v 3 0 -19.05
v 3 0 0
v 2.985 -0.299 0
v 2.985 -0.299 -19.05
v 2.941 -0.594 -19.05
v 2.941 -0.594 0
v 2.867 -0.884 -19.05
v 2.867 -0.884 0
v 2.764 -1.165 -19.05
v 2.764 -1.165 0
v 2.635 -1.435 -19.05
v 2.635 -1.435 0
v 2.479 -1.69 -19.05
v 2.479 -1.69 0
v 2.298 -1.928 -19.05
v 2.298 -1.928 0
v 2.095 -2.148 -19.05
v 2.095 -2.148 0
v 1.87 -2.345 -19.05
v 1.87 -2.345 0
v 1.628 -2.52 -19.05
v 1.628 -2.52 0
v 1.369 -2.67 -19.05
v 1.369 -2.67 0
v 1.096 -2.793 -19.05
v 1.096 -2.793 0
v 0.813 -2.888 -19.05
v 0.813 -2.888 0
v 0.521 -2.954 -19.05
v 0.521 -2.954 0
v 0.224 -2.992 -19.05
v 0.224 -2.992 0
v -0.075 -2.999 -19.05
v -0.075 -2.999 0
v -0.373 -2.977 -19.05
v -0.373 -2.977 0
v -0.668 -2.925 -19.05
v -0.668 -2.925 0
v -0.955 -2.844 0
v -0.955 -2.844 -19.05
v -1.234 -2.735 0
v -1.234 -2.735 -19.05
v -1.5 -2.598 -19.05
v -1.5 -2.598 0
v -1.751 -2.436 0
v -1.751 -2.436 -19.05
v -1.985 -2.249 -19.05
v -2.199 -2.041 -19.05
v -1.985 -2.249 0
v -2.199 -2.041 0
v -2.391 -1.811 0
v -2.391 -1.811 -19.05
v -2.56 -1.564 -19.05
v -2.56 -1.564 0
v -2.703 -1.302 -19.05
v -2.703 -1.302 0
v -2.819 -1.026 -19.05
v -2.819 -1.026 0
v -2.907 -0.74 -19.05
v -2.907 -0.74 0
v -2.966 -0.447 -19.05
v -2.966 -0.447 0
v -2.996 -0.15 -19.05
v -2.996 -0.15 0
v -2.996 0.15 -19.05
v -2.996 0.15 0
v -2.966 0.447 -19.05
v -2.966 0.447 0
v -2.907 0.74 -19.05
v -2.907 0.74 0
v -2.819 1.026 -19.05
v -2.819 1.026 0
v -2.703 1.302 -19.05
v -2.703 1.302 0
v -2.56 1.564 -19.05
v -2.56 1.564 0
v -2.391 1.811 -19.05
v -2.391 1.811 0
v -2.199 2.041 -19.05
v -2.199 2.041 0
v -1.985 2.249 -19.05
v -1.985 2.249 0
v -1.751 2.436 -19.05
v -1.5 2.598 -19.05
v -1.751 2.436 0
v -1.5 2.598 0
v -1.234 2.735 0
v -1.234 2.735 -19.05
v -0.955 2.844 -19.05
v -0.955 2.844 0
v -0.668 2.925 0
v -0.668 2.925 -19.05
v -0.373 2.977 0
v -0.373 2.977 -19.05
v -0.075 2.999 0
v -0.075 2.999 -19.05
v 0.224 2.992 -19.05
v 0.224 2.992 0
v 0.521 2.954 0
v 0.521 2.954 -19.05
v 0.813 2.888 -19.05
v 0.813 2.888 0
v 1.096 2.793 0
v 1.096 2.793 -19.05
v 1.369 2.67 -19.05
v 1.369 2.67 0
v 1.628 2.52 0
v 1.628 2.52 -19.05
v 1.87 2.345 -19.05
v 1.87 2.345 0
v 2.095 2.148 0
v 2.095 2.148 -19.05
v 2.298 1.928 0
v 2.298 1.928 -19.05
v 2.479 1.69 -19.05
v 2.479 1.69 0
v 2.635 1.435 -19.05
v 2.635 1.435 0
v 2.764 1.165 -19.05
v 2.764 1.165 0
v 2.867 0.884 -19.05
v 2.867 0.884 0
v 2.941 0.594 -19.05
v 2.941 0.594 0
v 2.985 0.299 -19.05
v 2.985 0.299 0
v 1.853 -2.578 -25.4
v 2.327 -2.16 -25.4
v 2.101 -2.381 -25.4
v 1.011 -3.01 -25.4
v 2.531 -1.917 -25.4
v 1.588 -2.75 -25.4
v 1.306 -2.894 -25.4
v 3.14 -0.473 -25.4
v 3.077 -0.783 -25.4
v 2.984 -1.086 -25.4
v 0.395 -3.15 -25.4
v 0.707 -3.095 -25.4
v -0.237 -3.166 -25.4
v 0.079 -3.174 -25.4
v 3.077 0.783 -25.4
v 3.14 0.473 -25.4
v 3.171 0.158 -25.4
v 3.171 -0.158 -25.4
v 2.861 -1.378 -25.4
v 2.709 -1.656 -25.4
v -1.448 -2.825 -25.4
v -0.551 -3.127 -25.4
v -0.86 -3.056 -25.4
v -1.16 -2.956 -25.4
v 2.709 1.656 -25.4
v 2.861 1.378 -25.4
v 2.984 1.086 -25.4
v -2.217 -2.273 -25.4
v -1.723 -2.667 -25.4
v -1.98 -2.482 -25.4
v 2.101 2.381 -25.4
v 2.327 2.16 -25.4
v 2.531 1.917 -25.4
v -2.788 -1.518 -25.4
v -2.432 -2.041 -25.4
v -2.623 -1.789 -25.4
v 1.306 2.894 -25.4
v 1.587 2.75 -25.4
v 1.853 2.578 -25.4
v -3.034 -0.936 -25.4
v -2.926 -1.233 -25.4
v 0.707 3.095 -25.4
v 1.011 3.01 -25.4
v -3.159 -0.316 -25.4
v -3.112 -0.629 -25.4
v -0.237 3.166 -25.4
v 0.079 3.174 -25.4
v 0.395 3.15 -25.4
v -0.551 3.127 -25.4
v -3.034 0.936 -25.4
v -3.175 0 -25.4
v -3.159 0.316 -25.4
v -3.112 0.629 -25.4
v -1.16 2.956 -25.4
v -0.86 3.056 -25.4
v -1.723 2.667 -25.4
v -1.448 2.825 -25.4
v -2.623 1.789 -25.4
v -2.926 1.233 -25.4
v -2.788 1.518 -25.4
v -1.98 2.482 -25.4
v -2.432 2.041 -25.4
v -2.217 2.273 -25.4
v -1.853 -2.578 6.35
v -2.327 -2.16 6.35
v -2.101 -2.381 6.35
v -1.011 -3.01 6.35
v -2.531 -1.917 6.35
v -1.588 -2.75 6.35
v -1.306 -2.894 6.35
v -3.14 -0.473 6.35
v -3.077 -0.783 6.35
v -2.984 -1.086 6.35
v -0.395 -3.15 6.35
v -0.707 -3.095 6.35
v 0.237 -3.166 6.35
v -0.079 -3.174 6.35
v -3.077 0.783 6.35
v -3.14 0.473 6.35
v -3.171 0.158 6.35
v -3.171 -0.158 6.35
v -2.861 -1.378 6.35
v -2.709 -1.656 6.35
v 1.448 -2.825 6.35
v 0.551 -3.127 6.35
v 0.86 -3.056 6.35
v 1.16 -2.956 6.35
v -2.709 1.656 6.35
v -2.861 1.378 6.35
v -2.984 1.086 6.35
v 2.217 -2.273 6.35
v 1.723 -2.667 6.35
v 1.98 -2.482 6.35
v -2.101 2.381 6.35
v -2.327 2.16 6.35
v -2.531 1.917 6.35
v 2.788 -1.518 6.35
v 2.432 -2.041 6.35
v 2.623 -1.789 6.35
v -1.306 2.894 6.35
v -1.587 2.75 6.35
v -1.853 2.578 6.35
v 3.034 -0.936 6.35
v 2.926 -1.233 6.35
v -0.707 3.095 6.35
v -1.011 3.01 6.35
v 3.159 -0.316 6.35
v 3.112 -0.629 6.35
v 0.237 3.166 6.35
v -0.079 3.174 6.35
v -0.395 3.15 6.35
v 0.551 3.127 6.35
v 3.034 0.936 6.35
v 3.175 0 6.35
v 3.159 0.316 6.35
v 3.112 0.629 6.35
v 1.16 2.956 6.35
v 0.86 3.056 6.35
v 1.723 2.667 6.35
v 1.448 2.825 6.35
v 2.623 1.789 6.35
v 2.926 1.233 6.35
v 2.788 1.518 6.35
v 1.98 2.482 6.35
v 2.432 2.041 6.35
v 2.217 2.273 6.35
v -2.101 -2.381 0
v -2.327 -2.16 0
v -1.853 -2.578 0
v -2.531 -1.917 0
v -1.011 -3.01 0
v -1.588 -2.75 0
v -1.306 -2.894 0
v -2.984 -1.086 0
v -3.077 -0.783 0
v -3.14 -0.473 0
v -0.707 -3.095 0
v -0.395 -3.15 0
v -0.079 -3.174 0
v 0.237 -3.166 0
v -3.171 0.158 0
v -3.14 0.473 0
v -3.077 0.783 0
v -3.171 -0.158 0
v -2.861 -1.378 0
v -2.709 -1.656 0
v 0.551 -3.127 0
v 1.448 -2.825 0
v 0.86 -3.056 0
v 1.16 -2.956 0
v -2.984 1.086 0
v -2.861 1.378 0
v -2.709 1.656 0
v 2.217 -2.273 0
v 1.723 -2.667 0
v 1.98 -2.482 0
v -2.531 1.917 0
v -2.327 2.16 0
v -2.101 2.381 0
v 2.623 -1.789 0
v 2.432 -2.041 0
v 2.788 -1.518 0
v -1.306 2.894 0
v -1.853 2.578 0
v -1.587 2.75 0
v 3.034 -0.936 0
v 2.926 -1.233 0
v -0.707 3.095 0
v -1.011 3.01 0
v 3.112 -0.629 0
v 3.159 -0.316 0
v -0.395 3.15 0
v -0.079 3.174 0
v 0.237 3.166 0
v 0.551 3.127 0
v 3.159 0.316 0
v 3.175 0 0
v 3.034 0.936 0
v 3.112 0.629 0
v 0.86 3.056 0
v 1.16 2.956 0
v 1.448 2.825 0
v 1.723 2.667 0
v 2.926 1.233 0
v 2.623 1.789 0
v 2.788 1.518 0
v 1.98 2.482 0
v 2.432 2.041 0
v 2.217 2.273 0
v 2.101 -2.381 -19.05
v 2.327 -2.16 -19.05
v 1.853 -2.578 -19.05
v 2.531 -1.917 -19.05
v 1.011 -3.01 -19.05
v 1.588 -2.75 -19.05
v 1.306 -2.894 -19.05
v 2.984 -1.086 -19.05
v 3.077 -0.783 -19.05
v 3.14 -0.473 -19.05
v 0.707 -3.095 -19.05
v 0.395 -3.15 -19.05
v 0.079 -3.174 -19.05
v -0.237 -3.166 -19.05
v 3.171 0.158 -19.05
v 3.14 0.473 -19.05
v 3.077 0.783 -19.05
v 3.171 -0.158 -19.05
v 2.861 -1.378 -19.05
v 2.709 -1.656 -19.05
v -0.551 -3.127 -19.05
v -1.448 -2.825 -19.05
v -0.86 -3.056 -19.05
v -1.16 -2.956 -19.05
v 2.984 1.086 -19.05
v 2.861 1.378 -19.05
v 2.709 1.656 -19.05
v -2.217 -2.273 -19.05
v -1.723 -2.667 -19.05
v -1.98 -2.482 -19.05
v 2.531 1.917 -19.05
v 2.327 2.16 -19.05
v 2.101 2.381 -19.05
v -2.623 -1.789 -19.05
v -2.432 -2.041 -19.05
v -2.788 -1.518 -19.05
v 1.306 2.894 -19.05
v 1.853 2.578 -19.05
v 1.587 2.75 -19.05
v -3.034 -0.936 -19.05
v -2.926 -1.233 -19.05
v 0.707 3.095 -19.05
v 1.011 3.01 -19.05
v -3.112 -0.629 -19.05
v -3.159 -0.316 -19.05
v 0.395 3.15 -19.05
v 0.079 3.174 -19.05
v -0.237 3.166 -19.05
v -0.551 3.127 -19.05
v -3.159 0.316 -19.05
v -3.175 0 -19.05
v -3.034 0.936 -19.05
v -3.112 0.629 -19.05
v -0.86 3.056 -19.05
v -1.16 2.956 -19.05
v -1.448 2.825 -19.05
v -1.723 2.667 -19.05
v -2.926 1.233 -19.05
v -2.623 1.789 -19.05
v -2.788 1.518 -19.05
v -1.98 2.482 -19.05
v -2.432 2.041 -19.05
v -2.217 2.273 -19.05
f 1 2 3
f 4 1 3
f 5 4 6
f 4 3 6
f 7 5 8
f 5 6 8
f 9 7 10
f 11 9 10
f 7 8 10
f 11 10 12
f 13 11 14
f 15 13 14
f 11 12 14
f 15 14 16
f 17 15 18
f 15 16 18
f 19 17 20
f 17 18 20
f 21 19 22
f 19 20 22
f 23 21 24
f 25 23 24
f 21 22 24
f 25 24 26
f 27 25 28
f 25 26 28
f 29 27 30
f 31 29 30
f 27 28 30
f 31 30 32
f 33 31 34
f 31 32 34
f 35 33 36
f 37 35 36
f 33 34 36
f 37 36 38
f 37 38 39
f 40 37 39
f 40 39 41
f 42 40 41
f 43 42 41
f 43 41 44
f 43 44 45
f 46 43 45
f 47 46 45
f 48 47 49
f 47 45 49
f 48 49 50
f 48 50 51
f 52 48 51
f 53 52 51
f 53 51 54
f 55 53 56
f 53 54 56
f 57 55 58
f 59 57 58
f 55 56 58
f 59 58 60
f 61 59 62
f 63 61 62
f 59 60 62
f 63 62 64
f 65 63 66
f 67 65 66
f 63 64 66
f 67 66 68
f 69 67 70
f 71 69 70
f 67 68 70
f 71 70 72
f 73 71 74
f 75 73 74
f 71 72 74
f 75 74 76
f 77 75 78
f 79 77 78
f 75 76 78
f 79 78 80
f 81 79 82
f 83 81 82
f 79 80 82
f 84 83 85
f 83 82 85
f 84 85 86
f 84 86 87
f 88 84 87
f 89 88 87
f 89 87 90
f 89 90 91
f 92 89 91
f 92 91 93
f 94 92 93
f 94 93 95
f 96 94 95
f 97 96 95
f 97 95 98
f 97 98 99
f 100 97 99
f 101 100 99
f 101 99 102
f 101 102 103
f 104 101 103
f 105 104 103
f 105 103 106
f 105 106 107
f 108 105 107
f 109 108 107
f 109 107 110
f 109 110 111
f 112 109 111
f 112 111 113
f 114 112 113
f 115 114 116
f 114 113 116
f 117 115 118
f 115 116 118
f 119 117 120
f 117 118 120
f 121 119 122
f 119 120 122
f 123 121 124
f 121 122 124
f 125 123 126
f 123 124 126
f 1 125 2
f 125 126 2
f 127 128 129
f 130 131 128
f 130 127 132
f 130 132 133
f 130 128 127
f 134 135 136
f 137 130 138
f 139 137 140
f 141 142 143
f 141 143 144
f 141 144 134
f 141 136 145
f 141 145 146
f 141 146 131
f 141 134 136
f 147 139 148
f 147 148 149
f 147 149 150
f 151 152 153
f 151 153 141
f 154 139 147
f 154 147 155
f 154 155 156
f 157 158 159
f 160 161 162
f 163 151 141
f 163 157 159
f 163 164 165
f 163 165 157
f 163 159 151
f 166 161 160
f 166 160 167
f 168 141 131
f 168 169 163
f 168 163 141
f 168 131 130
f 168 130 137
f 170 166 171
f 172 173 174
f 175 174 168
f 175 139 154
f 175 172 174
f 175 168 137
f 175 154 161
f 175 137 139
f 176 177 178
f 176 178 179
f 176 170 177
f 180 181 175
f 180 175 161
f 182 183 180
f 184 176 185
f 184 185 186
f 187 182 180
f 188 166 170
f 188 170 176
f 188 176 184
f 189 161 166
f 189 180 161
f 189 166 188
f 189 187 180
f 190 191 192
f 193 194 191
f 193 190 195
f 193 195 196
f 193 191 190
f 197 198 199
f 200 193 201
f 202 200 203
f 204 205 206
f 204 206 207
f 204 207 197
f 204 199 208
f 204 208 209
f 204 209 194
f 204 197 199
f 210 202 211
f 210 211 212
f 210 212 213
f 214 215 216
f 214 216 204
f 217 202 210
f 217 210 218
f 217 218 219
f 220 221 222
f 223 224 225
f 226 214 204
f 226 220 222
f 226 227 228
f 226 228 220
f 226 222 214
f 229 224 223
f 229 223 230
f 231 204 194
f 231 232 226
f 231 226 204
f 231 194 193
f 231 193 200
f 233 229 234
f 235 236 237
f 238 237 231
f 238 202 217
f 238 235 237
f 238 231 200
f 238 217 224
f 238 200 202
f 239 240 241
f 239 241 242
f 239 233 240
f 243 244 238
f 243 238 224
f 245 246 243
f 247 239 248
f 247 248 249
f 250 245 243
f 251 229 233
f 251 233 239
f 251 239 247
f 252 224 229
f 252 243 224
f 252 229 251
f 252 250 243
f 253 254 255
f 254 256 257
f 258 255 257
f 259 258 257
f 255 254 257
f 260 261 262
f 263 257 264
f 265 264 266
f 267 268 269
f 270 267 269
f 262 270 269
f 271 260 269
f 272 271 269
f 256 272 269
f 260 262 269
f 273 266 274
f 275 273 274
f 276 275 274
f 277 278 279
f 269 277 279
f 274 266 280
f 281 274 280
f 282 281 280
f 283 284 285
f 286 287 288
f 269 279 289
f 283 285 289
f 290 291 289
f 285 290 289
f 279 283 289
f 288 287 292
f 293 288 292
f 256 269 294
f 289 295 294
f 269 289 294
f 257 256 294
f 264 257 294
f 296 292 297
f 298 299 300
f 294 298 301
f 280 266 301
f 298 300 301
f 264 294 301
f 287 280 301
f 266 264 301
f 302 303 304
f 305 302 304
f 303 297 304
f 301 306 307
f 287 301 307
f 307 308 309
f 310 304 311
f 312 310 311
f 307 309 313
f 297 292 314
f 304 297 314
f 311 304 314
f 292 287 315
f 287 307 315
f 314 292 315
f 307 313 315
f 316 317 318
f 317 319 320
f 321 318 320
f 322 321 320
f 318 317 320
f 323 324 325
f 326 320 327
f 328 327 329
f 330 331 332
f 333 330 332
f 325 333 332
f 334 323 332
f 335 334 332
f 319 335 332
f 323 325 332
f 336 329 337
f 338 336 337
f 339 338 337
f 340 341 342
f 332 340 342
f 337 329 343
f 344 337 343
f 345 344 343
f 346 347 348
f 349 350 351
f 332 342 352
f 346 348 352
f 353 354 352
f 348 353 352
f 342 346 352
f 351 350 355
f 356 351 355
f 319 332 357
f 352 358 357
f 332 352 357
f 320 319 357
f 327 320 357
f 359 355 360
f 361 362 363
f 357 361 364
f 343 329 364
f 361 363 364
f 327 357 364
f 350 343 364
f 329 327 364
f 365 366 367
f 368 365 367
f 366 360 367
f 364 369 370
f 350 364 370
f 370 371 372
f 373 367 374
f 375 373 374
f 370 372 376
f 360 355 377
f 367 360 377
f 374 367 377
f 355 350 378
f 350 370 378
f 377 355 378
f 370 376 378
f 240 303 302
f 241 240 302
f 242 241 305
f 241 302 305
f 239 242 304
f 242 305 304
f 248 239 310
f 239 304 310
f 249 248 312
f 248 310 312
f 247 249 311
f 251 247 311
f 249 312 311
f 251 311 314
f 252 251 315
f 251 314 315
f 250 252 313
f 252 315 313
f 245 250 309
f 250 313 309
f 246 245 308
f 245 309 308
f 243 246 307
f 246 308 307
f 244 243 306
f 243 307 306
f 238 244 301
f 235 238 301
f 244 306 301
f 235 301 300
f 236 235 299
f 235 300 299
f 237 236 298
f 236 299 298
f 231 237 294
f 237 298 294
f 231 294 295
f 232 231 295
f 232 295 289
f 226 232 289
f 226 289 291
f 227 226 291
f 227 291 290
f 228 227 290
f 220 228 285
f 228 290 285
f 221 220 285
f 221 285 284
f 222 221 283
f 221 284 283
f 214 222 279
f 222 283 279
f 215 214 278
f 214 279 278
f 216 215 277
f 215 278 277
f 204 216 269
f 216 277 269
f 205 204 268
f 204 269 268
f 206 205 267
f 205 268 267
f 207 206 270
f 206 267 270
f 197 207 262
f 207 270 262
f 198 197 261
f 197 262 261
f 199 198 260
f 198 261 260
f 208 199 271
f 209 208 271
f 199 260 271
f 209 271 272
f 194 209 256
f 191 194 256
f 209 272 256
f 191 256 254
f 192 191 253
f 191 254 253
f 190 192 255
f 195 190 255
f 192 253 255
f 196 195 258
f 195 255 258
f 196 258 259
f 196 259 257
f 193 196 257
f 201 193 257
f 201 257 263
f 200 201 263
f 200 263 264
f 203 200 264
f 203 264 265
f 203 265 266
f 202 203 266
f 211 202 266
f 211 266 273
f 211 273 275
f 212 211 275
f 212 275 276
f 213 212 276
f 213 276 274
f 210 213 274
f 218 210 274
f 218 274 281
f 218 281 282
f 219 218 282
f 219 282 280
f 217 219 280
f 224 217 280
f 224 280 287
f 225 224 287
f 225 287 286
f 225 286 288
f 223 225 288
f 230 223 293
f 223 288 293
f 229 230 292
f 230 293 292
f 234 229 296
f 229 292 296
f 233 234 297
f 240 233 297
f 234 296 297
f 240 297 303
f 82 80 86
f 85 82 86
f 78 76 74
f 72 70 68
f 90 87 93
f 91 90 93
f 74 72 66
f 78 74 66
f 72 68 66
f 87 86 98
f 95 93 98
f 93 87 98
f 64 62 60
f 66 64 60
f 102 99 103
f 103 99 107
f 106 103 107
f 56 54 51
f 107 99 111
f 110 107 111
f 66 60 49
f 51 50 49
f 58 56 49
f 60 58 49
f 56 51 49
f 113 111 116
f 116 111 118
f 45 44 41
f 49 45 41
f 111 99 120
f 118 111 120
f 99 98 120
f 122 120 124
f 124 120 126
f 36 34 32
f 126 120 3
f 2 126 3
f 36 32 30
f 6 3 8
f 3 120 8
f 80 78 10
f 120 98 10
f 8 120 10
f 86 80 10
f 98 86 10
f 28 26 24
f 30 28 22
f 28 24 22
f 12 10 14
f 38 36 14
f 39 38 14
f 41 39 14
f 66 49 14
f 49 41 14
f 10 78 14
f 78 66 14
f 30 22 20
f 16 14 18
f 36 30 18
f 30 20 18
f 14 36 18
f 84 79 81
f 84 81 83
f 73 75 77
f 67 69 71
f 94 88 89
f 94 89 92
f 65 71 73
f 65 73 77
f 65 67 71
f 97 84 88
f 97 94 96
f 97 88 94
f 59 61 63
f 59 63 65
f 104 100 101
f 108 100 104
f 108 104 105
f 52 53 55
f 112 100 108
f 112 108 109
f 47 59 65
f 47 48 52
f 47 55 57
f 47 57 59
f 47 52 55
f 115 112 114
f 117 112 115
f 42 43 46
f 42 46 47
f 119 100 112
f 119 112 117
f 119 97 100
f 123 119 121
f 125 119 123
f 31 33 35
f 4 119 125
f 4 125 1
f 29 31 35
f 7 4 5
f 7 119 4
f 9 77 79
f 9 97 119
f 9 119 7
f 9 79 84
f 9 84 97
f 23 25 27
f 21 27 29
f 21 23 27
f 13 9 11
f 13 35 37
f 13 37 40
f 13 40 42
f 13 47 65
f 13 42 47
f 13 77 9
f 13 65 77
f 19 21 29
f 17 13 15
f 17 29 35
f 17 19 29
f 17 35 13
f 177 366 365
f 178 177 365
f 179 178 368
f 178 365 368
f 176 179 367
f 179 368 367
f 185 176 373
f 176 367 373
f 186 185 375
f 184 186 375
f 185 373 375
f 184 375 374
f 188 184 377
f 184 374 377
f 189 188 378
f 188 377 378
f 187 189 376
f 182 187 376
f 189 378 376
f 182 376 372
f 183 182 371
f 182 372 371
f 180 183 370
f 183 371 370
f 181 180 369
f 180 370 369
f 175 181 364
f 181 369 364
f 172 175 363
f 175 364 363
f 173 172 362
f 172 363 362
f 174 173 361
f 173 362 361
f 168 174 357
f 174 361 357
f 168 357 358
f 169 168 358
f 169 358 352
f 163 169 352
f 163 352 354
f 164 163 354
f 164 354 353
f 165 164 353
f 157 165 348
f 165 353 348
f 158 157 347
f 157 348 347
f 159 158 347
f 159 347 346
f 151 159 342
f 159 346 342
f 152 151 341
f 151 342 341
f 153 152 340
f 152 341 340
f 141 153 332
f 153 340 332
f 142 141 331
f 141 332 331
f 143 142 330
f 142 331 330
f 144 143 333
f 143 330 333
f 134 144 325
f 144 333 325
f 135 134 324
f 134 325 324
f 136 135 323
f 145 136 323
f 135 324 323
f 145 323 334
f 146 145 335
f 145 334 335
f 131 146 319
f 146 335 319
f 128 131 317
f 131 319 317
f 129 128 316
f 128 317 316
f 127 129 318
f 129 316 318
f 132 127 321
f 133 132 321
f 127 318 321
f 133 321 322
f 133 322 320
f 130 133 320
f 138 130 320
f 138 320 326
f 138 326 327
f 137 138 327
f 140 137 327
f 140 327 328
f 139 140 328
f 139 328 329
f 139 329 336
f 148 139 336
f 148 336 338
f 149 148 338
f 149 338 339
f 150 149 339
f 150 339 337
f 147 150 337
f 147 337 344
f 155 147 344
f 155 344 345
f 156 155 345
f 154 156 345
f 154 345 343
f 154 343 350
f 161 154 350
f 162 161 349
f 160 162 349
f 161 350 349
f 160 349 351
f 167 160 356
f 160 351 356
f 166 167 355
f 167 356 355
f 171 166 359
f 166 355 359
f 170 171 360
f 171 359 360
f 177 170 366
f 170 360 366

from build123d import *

# Parameters (mm, degrees)
SKETCH1_R           = 3.175
BOSS_EXTRUDE1_DEPTH = 6.35
SKETCH2_R           = 3
BOSS_EXTRUDE2_DEPTH = 19.05
SKETCH3_R           = 3.175
BOSS_EXTRUDE3_DEPTH = 6.35


with BuildPart() as part:
    # Sketch1 → Boss-Extrude1 (new body)
    with BuildSketch(Plane.XY):
        Circle(SKETCH1_R)
    extrude(amount=BOSS_EXTRUDE1_DEPTH)


with BuildPart() as body_2:
    # Sketch2 → Boss-Extrude2 (new body)
    with BuildSketch(Plane(origin=(0, 0, 0), x_dir=(-1, 0, 0), z_dir=(0, 0, -1))):
        with Locations(Location((0, 0, 0), (0, 0, 180))):
            Circle(SKETCH2_R)
    extrude(amount=BOSS_EXTRUDE2_DEPTH)


with BuildPart() as body_3:
    # Sketch3 → Boss-Extrude3 (new body)
    with BuildSketch(Plane(origin=(0, 0, -19.05), x_dir=(-1, 0, 0), z_dir=(0, 0, -1))):
        Circle(SKETCH3_R)
    extrude(amount=BOSS_EXTRUDE3_DEPTH)


solid = Compound([part.part, body_2.part, body_3.part])
